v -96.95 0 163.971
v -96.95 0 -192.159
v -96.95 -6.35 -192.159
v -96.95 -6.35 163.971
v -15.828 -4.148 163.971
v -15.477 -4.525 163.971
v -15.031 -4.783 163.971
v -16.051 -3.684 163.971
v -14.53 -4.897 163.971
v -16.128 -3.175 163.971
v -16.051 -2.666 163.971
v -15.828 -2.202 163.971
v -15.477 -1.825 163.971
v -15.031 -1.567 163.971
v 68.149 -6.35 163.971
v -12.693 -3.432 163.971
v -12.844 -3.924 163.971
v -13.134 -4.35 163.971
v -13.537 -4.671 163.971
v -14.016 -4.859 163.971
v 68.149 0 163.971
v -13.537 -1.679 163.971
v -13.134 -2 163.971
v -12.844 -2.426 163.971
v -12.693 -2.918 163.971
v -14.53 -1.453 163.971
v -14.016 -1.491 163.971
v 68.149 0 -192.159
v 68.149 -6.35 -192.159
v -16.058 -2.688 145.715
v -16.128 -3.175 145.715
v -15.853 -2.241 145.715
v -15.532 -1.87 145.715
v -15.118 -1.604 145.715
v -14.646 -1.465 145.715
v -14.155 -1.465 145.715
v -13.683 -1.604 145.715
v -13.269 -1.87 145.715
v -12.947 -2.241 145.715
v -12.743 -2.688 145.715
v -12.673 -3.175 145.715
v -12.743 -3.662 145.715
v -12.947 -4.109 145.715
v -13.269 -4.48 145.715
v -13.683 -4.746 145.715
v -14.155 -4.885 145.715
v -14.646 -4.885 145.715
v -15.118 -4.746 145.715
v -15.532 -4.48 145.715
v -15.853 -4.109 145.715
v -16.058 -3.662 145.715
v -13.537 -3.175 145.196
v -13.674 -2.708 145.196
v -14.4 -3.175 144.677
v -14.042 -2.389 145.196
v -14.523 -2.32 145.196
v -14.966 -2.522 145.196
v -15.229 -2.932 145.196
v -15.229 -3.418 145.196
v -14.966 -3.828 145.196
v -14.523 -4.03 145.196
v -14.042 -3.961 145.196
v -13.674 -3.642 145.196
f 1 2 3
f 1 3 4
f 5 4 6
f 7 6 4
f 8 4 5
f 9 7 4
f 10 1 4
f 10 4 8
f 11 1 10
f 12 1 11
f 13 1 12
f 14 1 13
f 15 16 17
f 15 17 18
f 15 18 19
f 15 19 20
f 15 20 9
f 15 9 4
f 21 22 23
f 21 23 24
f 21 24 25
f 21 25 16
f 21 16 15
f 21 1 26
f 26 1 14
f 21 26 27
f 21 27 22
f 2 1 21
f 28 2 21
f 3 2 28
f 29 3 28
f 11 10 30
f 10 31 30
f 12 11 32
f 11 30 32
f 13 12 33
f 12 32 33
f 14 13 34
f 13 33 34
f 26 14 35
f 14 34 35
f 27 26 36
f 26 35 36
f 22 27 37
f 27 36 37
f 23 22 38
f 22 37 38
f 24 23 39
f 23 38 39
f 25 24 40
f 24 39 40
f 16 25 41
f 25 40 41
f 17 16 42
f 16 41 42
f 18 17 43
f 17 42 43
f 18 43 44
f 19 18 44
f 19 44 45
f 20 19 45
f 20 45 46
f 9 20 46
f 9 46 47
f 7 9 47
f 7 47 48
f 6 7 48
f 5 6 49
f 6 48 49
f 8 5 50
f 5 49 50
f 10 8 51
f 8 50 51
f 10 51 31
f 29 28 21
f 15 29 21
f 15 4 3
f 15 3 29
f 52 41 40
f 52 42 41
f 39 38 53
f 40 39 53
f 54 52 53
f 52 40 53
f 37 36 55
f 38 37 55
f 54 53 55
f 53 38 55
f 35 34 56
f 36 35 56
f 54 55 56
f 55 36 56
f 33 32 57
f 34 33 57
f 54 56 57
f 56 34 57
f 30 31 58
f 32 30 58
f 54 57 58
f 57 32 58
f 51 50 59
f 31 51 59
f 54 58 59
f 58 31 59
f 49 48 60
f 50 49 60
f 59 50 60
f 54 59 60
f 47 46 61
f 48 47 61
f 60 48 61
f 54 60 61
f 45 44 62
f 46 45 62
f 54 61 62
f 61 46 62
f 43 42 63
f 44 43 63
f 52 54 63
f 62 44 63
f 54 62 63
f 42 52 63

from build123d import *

# Parameters (mm, degrees)
F0_W     = 165.0993153453
F0_H     = 356.130450964
F1_DEPTH = 6.35
F3_D     = 3.4544
F3_DEPTH = 18.25625
F3_TIP   = 1.0378064612


# Not quite as in the source:
# - a length typed as a fraction of an inch, garbled in the dataset ("3 / 203.2 mm" for 3/8 in), is restored


with BuildPart() as f1:
    # F0 (on Front) → F1 (new body)
    with BuildSketch(Plane.XZ):
        with Locations((-14.4004262984, -14.0939205885)):
            Rectangle(F0_W, F0_H)
    extrude(amount=F1_DEPTH)

    # F3
    with Locations(Plane.XY.offset(163.9713048935)):
        with Locations((-14.4004262984, -3.175)):
            Hole(F3_D / 2, depth=F3_DEPTH)
            with Locations((0, 0, -(F3_DEPTH + F3_TIP / 2))):  # 118° drill point
                Cone(0, F3_D / 2, F3_TIP, mode=Mode.SUBTRACT)


solid = f1.part
